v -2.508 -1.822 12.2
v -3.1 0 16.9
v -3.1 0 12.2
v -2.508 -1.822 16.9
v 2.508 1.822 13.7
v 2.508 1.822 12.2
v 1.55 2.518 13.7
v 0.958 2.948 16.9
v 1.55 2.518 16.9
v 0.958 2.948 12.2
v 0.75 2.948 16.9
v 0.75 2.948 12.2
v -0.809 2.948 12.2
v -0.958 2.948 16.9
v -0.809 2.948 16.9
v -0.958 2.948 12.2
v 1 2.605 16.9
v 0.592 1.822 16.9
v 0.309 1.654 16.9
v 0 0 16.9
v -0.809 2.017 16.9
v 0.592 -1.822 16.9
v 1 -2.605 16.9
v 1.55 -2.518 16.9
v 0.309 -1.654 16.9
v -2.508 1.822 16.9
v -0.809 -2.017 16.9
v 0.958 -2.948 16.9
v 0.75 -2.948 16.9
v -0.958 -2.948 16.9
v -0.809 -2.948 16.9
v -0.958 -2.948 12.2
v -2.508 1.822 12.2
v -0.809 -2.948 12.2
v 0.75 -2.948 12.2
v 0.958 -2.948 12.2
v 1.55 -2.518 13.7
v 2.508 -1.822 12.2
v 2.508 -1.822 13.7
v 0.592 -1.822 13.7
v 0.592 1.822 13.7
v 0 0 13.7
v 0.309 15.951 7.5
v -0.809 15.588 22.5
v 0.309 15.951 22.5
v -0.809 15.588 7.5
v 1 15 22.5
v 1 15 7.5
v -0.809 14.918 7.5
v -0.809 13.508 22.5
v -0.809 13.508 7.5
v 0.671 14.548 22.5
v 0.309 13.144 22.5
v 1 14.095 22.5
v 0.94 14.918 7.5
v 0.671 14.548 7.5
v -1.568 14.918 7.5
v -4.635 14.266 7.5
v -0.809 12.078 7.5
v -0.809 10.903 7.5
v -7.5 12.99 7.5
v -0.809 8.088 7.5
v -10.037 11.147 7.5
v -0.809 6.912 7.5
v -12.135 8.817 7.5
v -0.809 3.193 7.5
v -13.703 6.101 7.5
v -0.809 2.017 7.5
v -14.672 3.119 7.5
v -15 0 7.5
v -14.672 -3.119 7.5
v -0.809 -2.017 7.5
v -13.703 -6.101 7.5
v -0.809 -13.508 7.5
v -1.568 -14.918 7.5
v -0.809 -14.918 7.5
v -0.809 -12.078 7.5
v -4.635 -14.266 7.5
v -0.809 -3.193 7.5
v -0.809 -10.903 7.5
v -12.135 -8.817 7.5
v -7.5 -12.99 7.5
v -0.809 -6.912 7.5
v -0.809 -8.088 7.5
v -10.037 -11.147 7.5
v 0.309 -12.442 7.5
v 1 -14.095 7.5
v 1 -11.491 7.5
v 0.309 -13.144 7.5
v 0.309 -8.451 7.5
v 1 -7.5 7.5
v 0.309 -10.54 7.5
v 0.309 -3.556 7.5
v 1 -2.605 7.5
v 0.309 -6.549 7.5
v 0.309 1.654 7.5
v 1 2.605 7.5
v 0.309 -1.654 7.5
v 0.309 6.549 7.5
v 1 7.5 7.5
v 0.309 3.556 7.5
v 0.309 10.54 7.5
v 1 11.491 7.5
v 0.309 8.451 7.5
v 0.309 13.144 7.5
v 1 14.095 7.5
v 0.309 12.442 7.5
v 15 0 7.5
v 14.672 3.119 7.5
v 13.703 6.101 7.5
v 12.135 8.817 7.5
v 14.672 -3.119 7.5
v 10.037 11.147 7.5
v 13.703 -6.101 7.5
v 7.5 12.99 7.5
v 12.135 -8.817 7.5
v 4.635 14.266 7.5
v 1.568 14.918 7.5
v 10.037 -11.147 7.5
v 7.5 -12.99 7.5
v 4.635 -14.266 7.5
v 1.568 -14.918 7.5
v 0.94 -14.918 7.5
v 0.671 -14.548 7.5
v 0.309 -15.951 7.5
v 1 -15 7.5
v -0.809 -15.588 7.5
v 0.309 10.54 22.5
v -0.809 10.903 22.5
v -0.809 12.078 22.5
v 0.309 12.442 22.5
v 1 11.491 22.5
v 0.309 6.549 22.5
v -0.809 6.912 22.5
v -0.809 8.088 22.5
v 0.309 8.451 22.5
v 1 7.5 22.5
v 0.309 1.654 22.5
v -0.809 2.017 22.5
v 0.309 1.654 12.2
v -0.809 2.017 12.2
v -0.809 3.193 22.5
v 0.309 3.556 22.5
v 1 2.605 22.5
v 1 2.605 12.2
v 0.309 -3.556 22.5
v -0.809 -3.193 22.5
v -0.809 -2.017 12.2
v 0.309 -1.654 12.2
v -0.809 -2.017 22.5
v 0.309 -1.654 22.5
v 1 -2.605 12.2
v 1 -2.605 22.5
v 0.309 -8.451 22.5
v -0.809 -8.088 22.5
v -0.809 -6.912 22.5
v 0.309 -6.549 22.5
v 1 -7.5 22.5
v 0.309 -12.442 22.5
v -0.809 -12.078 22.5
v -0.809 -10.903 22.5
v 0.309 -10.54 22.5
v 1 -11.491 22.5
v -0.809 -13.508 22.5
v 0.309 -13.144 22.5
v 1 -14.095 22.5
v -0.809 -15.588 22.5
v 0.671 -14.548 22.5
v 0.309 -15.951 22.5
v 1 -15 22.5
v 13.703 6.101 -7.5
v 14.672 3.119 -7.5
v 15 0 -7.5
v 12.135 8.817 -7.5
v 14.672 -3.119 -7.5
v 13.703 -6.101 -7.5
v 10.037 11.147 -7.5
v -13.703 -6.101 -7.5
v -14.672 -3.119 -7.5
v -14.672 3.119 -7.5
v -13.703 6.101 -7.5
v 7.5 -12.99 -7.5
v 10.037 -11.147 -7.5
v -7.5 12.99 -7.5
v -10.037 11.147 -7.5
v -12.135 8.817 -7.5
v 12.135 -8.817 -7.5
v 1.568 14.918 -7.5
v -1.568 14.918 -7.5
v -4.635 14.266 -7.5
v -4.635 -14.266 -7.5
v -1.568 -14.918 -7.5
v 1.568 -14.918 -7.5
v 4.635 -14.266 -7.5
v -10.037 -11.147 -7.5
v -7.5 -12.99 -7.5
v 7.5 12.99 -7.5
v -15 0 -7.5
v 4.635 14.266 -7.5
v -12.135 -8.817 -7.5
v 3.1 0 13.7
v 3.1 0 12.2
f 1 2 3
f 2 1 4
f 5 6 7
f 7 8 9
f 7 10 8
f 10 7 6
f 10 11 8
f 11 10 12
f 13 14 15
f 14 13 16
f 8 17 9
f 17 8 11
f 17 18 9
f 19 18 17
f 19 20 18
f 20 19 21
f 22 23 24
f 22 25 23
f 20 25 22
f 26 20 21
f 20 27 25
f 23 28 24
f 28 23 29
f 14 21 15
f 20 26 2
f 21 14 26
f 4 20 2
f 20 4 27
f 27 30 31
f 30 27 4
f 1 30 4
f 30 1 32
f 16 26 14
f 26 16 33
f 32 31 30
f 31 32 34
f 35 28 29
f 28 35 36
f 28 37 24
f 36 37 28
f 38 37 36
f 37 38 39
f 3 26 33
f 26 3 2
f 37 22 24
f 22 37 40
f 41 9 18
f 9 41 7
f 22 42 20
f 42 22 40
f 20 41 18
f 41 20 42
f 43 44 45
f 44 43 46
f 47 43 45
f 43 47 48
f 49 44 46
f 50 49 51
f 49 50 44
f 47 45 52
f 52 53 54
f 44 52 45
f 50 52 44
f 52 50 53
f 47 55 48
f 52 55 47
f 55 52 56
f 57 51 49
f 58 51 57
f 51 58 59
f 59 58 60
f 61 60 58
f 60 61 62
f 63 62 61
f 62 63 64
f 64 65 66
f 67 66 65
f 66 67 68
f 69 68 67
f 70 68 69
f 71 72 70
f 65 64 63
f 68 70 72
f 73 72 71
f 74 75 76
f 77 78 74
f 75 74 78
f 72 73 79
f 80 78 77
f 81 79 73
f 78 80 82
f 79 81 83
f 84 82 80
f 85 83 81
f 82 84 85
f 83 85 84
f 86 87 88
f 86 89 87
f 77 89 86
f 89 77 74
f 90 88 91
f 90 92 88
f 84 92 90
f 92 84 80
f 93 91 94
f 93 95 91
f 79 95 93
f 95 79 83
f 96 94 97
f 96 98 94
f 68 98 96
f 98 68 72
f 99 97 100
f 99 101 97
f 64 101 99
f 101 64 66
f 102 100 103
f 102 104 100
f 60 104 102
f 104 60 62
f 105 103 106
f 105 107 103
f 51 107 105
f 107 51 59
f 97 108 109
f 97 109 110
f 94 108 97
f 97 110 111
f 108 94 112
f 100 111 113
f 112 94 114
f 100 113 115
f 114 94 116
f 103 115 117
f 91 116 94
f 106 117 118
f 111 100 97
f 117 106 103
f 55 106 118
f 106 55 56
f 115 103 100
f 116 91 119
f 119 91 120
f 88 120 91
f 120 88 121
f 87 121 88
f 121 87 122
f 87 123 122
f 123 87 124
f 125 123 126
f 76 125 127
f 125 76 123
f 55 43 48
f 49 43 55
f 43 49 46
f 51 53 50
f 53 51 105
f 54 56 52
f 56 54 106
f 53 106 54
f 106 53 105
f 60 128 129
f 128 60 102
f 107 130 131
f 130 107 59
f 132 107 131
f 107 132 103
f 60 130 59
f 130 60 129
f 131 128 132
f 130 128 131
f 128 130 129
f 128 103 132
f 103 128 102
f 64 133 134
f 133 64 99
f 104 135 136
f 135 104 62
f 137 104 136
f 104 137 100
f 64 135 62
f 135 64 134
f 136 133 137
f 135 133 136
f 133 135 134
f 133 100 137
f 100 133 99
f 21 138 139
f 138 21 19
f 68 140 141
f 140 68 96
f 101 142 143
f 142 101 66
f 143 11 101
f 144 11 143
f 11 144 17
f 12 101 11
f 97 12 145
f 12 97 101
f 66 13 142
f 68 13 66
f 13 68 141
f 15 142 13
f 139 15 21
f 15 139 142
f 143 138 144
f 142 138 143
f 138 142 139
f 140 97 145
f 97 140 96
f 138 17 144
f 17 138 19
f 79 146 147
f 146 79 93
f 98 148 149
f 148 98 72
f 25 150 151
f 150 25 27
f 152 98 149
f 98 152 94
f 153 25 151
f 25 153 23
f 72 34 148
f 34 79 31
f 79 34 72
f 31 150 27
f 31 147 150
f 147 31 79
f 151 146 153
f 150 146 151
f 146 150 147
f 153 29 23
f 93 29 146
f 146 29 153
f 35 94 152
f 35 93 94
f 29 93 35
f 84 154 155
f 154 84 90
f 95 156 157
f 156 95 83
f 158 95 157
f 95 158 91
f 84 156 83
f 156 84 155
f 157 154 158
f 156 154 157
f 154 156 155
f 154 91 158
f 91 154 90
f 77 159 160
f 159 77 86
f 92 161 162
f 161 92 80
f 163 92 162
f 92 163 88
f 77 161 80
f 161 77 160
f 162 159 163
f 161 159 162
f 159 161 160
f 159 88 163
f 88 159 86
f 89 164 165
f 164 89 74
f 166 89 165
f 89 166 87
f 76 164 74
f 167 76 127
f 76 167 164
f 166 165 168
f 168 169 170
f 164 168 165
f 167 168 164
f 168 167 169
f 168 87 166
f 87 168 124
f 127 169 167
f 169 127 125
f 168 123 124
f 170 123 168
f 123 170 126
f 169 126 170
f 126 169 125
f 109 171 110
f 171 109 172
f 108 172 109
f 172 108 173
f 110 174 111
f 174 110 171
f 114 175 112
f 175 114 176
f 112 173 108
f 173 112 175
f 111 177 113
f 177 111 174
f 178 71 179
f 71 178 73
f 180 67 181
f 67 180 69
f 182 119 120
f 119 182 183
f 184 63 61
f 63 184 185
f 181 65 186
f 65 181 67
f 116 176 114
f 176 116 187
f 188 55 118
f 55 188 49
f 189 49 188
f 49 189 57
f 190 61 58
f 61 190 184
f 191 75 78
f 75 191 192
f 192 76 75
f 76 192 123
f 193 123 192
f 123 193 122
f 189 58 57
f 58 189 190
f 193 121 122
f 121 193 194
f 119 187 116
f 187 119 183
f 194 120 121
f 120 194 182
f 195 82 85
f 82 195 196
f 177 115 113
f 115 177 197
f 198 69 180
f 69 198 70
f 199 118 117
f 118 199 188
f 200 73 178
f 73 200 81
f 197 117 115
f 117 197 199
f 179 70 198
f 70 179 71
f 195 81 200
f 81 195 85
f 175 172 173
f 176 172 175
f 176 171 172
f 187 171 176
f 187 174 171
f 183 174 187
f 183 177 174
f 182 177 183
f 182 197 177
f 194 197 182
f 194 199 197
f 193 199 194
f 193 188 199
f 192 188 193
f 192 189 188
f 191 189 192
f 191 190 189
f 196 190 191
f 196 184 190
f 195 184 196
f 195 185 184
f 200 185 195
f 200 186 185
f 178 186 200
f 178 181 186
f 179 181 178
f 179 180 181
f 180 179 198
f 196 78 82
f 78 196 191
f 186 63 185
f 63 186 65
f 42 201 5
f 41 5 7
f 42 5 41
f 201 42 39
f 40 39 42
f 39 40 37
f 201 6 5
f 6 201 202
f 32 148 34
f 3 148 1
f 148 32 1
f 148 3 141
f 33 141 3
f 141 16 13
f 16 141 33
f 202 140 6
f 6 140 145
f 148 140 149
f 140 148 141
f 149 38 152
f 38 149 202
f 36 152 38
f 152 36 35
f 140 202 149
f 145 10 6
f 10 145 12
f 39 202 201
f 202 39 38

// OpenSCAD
// Dimensions in mm
knob_diameter = 30;
knob_height = 15;
d_bore_diameter = 6.2;
d_bore_flat_distance = 4.7;
groove_diameter = 2;
groove_depth = 0;

// Z-axis offset to mirror the knob on the XY plane
z_offset = -knob_height / 2;

// Build the knob
translate([0, 0, z_offset])
    cylinder(h=knob_height, d=knob_diameter);

// Build the D-shaped blind bore
translate([0, 0, knob_height/2 + d_bore_flat_distance])
    difference() {
        cylinder(h=d_bore_flat_distance, d=d_bore_diameter);
        translate([d_bore_diameter/2, 0, -groove_depth/2])
            cylinder(h=d_bore_flat_distance, d=6.2);
    }

// Build the vertical grip grooves
for (i = [0:17]) {
    angle = i * 360 / 18;
    translate([0, cos(angle)*knob_diameter/2, knob_height/2])
        cylinder(h=knob_height, d=groove_diameter);
}

// Build the pointer groove
translate([0, 0, knob_height/2 + d_bore_flat_distance])
    linear_extrude(height=1.5) {
        circle(r=d_bore_diameter/2, center=true);
    }
